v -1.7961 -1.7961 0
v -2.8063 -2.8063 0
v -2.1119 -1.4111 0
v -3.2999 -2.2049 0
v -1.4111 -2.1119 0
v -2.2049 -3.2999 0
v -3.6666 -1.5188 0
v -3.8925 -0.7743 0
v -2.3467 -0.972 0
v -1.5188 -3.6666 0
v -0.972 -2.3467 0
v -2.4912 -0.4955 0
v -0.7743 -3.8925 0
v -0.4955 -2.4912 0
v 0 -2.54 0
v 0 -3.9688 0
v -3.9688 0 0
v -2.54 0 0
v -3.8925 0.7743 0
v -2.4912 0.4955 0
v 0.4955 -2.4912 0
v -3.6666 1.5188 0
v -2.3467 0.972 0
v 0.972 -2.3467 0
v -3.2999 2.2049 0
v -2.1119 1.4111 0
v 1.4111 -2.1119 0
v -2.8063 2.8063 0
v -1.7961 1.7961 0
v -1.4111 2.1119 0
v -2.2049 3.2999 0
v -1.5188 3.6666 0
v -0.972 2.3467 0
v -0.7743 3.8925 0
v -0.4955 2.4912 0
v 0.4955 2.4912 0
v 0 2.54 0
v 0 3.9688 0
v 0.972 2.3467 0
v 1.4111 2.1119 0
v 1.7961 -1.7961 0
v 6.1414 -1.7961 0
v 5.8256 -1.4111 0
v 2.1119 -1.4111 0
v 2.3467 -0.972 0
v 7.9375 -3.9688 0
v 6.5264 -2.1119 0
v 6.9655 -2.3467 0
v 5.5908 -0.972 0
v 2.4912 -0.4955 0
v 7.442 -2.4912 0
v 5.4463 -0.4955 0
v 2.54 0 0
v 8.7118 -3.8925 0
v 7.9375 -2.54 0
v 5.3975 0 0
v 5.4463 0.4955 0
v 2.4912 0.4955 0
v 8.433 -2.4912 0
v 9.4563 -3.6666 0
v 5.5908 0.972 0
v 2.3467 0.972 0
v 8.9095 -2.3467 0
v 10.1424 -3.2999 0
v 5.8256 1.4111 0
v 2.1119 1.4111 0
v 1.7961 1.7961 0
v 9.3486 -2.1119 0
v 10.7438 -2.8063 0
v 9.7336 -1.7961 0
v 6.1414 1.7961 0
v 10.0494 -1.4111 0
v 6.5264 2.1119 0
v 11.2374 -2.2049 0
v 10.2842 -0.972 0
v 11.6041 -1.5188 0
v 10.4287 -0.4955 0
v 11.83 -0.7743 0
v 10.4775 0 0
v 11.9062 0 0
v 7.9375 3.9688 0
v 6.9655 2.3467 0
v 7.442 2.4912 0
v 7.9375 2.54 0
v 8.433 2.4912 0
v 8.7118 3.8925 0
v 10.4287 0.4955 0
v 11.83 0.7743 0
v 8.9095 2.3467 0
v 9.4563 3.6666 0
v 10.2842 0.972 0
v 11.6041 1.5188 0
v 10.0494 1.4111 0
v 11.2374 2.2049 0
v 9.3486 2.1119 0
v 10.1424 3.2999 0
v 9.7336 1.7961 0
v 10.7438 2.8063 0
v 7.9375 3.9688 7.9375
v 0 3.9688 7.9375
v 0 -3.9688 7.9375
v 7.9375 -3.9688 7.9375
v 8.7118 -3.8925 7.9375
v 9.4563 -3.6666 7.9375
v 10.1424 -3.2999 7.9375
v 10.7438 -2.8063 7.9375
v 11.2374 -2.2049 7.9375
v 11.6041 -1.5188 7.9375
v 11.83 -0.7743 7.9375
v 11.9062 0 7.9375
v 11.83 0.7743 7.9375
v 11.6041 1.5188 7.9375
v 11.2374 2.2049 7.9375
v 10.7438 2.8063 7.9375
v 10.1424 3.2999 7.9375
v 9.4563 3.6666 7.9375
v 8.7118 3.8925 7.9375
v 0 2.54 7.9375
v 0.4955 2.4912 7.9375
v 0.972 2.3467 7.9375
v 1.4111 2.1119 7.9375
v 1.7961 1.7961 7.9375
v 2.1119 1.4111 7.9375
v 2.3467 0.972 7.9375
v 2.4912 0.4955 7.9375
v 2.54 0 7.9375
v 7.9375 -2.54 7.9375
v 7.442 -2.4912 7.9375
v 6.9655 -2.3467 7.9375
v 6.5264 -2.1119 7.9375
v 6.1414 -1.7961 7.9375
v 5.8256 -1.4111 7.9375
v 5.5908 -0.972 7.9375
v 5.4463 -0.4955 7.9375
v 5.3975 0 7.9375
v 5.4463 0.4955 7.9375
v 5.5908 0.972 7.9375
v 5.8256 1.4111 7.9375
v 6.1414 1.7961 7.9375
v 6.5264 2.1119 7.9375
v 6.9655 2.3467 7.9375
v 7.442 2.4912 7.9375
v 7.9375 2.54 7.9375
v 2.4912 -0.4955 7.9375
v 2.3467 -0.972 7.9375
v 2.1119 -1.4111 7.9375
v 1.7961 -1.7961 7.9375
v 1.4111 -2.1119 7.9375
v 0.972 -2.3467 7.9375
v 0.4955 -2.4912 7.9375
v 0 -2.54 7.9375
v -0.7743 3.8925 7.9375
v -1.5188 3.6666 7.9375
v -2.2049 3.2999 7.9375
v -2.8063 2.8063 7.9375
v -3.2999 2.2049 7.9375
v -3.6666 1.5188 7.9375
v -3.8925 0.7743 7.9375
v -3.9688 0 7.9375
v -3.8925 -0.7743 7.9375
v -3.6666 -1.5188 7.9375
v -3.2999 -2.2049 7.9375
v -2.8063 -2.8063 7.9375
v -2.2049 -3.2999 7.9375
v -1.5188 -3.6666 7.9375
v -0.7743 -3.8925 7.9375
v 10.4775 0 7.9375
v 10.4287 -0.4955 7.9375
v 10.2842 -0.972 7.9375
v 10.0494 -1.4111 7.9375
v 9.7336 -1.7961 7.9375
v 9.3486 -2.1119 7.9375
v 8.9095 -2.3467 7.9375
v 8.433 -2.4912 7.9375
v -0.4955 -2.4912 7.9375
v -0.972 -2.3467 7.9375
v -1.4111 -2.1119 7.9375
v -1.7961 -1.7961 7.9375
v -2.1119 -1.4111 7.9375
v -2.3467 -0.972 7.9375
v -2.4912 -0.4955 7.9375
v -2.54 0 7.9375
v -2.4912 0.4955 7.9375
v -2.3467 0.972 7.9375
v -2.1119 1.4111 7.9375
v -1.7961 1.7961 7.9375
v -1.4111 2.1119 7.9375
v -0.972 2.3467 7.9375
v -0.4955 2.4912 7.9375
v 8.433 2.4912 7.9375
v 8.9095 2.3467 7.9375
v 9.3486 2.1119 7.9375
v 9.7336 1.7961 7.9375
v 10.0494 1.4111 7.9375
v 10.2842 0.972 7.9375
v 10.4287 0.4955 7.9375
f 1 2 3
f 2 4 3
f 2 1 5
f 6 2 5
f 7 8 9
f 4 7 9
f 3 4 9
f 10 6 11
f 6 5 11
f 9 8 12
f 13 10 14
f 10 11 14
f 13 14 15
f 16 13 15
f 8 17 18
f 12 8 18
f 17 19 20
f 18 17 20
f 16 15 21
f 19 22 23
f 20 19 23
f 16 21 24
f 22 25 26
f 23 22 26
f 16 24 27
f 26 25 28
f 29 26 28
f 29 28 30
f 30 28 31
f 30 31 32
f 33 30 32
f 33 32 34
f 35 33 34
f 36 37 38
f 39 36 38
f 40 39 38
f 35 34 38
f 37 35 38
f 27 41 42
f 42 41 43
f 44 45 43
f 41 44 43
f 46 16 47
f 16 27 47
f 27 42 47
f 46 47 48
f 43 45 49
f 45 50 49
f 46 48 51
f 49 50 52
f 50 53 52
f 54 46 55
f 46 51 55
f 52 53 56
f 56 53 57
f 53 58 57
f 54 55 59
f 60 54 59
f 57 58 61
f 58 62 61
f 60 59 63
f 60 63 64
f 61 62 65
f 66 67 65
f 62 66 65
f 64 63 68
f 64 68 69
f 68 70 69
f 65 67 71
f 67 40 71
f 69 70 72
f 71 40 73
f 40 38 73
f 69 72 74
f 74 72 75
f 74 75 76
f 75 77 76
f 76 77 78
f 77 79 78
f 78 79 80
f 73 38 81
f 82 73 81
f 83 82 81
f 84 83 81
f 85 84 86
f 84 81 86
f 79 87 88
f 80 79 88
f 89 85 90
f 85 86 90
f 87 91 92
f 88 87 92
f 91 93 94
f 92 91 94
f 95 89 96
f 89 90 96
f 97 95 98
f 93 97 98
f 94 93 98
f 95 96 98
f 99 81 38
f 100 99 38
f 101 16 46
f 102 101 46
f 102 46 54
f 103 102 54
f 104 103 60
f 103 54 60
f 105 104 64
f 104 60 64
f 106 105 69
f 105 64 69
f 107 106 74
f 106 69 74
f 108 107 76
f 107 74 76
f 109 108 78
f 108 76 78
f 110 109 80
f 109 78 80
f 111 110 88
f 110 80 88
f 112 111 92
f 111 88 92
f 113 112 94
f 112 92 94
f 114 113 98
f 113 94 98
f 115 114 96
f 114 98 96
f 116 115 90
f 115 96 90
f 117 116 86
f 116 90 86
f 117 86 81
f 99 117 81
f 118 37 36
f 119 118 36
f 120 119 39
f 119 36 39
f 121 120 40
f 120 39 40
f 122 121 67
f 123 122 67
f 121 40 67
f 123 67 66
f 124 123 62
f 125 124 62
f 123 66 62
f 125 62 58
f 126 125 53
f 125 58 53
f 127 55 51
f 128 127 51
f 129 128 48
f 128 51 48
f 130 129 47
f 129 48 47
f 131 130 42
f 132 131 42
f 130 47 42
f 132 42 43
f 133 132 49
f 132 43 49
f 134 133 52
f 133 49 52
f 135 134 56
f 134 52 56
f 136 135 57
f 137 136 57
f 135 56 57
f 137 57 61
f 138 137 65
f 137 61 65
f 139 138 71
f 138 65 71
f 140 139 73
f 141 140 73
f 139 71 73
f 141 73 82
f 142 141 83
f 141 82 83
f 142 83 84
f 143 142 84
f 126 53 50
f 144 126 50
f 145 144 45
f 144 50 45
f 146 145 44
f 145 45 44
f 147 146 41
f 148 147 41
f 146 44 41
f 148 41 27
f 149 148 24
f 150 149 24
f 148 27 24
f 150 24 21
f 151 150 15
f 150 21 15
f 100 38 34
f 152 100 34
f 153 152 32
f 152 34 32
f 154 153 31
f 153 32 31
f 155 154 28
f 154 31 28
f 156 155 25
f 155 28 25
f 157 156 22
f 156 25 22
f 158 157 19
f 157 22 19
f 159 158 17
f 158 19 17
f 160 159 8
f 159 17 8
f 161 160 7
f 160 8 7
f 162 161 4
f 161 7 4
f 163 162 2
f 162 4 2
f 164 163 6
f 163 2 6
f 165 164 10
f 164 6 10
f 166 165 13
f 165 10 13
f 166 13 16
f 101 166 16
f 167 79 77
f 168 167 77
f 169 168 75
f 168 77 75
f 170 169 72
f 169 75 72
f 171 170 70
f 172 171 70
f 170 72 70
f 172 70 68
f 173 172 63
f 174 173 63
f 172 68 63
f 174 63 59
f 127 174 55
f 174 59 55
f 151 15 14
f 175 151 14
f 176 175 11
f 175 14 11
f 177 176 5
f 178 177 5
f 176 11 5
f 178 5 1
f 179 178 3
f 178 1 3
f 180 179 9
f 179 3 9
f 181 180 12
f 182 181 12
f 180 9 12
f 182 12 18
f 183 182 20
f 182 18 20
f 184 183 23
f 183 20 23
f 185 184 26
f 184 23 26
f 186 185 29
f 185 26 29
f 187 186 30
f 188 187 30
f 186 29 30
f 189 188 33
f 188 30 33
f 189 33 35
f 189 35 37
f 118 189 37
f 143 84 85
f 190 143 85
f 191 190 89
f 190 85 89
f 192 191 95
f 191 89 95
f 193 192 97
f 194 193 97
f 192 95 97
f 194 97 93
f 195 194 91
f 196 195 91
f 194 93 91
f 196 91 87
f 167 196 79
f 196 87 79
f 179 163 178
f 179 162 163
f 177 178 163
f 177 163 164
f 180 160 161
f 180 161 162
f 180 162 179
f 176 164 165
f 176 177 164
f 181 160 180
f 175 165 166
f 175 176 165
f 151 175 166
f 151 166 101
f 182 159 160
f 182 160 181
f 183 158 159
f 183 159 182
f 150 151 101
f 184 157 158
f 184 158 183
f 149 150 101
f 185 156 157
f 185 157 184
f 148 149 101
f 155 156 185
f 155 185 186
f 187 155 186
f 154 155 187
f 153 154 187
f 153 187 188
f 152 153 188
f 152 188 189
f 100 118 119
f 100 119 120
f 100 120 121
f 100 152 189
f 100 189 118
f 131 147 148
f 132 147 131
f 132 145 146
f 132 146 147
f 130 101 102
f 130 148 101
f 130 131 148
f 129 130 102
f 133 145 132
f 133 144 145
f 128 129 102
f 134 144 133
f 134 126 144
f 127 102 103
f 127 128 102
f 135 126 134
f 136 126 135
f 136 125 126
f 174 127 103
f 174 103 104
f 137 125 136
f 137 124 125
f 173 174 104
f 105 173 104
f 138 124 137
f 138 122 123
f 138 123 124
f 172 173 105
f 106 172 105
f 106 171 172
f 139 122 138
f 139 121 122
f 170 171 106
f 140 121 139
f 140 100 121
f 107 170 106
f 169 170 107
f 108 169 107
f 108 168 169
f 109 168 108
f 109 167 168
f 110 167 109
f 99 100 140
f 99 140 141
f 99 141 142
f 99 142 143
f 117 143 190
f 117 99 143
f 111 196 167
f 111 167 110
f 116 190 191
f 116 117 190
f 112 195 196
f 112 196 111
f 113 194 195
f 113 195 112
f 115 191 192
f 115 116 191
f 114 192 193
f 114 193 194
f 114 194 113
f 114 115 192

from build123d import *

# Parameters (mm, degrees)
F1_DEPTH = 7.9375


with BuildPart() as f1:
    # F0 (on Top) → F1 (new body)
    with BuildSketch(Plane.XY):
        with BuildLine():
            Line((7.9375, 3.96875), (0, 3.96875))
            Line((0, 3.96875), (0, 2.54))
            ThreePointArc((0, 2.54), (1.796051, 1.796051), (2.54, 0))
            ThreePointArc((2.54, 0), (1.796051, -1.796051), (0, -2.54))
            Line((0, -2.54), (0, -3.96875))
            Line((0, -3.96875), (7.9375, -3.96875))
            Line((7.9375, -3.96875), (7.9375, -2.54))
            ThreePointArc((7.9375, -2.54), (5.3975, 0), (7.9375, 2.54))
            Line((7.9375, 2.54), (7.9375, 3.96875))
        make_face()
        with BuildLine():
            Line((0, 2.54), (0, 3.96875))
            ThreePointArc((0, 3.96875), (-3.96875, 0), (0, -3.96875))
            Line((0, -3.96875), (0, -2.54))
            ThreePointArc((0, -2.54), (-2.54, 0), (0, 2.54))
        make_face()
        with BuildLine():
            ThreePointArc((7.9375, -3.96875), (11.90625, 0), (7.9375, 3.96875))
            Line((7.9375, 3.96875), (7.9375, 2.54))
            ThreePointArc((7.9375, 2.54), (9.733551, 1.796051), (10.4775, 0))
            ThreePointArc((10.4775, 0), (9.733551, -1.796051), (7.9375, -2.54))
            Line((7.9375, -2.54), (7.9375, -3.96875))
        make_face()
    extrude(amount=F1_DEPTH)


solid = f1.part
